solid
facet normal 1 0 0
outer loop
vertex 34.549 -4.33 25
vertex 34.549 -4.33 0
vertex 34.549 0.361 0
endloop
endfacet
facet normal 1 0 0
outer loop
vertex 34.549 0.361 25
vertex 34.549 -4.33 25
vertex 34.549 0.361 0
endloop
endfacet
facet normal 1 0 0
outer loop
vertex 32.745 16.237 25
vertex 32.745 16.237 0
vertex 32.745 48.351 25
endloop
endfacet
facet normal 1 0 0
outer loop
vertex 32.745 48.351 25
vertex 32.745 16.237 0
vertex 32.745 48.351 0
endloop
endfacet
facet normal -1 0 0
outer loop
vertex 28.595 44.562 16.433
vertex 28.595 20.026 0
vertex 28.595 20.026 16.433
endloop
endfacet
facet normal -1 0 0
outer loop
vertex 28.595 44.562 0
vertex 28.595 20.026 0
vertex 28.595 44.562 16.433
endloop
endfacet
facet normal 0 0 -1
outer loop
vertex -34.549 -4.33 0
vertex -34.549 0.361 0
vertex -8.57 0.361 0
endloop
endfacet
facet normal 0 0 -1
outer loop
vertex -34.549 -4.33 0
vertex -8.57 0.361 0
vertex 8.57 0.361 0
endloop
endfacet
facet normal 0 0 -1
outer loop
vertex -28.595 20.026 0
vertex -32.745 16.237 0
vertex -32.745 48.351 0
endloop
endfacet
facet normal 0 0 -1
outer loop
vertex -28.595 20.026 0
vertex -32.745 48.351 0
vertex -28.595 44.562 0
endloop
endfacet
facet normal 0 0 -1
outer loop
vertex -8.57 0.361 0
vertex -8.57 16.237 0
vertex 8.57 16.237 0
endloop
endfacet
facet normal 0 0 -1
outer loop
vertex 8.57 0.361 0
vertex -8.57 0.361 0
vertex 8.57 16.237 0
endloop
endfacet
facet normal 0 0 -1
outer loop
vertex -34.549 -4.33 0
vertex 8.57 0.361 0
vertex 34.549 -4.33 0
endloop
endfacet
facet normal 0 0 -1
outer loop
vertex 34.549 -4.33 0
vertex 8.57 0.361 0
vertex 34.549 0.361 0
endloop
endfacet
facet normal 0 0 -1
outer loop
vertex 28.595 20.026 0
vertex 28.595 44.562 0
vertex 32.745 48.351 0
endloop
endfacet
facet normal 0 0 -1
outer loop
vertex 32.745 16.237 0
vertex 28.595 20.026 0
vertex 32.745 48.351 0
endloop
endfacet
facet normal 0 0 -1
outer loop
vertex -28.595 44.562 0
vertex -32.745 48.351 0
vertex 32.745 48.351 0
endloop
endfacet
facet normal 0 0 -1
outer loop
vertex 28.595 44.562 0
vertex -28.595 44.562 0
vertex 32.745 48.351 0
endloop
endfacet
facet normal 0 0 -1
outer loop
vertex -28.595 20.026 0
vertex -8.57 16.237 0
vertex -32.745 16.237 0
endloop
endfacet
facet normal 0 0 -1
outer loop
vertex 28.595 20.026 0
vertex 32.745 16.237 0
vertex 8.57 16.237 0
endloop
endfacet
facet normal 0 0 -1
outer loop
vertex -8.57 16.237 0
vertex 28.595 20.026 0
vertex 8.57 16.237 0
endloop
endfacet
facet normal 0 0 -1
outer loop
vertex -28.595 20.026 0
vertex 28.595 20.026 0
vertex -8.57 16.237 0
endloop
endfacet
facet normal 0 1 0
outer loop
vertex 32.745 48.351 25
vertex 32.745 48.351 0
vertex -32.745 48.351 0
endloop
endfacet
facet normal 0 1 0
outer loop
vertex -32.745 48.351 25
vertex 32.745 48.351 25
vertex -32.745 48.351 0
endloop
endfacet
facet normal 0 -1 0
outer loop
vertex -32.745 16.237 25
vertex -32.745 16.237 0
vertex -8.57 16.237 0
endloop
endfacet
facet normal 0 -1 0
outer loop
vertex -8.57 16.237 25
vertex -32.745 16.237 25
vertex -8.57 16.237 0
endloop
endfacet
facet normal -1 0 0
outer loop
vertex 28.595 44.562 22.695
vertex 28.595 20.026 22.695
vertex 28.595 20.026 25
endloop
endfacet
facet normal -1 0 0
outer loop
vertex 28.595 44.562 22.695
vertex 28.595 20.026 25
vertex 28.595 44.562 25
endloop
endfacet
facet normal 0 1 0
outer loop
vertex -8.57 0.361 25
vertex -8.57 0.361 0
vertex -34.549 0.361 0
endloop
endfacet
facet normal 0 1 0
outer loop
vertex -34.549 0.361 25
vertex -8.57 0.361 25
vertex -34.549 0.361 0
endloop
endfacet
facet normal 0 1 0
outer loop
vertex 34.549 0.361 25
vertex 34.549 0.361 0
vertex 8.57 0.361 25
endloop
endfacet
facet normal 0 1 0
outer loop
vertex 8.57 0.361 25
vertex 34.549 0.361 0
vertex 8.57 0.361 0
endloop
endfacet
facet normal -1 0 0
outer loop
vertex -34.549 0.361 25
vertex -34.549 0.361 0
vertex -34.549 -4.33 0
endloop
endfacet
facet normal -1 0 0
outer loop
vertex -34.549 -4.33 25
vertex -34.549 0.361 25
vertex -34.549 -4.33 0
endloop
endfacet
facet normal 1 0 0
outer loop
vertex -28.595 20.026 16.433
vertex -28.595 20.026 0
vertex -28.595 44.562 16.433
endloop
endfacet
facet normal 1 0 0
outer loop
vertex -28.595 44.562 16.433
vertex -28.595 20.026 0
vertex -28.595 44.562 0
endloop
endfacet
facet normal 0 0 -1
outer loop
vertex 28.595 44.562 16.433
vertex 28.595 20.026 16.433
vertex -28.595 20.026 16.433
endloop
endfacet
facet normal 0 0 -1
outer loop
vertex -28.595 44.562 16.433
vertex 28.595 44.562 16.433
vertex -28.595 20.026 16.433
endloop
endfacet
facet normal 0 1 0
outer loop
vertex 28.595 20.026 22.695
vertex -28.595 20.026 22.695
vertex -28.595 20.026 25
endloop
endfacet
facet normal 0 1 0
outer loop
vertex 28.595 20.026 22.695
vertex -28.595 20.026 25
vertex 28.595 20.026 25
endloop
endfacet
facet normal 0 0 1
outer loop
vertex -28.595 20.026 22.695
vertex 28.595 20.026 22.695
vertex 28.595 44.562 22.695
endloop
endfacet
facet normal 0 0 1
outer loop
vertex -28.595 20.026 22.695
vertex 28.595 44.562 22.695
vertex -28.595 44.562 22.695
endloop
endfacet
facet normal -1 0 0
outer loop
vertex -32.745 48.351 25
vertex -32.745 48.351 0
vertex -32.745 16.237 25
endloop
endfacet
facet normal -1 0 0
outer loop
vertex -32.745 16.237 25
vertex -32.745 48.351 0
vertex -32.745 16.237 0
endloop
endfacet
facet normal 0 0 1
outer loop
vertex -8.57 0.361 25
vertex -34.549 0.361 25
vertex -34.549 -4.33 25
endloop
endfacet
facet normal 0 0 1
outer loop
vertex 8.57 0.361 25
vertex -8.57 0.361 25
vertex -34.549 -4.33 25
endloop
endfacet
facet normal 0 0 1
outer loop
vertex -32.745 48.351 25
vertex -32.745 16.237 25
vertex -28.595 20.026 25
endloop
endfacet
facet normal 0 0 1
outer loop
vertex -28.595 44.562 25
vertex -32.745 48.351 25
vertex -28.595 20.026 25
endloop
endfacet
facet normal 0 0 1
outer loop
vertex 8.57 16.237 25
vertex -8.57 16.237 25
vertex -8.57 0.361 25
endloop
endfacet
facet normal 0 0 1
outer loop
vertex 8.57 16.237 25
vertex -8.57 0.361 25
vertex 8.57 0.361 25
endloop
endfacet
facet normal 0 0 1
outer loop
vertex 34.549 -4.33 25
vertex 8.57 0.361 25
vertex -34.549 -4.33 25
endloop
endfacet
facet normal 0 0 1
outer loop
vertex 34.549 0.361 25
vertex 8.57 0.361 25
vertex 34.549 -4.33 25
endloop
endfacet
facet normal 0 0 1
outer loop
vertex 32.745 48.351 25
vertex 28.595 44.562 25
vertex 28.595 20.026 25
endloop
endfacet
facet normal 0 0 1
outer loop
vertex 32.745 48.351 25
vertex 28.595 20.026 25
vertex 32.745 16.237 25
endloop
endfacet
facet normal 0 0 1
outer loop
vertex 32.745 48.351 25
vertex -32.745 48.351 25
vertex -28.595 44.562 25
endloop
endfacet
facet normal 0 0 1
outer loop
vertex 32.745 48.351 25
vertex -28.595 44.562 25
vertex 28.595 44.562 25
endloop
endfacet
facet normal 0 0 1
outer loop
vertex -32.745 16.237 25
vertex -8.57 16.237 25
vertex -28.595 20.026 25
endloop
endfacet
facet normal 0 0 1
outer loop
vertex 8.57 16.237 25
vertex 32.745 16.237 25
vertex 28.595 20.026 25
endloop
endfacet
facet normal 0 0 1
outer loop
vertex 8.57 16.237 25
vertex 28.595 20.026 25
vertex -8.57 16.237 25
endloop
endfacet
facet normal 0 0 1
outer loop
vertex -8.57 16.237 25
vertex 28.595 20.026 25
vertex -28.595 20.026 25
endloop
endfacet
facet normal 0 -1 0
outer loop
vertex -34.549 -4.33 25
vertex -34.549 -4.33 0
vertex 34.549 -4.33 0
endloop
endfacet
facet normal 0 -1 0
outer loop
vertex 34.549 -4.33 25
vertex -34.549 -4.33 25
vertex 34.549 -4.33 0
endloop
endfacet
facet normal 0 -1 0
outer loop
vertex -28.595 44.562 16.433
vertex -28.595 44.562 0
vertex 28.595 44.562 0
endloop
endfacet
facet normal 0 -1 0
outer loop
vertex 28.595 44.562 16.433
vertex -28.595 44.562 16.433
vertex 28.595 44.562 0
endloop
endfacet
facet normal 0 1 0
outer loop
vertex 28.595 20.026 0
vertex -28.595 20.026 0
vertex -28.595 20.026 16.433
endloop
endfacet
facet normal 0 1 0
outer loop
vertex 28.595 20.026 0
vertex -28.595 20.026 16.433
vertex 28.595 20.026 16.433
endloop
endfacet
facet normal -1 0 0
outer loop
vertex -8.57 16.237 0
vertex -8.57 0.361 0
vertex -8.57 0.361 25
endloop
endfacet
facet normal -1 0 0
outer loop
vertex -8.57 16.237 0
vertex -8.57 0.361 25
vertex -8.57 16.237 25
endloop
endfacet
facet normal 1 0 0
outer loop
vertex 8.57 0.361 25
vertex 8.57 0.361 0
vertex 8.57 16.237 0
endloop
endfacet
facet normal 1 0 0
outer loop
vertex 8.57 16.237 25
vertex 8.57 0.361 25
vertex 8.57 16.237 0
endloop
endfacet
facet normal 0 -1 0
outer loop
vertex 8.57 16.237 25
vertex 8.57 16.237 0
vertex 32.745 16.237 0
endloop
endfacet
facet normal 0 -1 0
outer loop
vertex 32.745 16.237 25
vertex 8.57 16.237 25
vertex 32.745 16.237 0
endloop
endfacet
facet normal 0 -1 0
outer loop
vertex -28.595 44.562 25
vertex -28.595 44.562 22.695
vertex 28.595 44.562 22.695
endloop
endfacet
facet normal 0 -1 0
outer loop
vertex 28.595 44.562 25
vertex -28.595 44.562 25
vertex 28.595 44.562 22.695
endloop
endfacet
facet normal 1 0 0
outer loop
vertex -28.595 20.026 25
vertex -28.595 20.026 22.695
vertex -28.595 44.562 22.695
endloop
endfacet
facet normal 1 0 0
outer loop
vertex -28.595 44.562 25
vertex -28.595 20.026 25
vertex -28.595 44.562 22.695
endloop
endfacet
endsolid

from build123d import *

# Parameters (mm, degrees)
F0_W     = 57.1907274425
F0_H     = 24.536088109
F0_W_2   = 17.1391749755
F0_H_2   = 15.8762889914
F0_H_3   = 0.3608246334
F1_DEPTH = 25
F2_W     = 57.1907274425
F2_H     = 6.2615685165
F3_DEPTH = 25.4


with BuildPart() as f1:
    # F0 (on Top) → F1 (new body)
    with BuildSketch(Plane.XY):
        Polygon((32.7448472381, 16.2371136248), (32.7448472381, 48.3505167067), (-32.7448472381, 48.3505167067), (-32.7448472381, 16.2371136248), (-8.5695888847, 16.2371136248), (8.5695860907, 16.2371136248), align=None)
        with Locations((0, 32.2938151658)):
            Rectangle(F0_W, F0_H, mode=Mode.SUBTRACT)
        with Locations((-1.397e-06, 8.2989691291)):
            Rectangle(F0_W_2, F0_H_2)
        Polygon((34.5489680767, 0.3608246334), (8.5695860907, 0.3608246334), (8.5695860907, 0), (-8.5695888847, 0), (-8.5695888847, 0.3608246334), (-34.5489680767, 0.3608246334), (-34.5489680767, -4.3298969977), (34.5489680767, -4.3298969977), align=None)
        with Locations((-1.397e-06, 0.1804123167)):
            Rectangle(F0_W_2, F0_H_3)
    extrude(amount=F1_DEPTH)

    # F2 (on face) → F3 (join)
    with BuildSketch(Plane(origin=(0, 20.0257711112, 0), x_dir=(-1, 0, 0), z_dir=(0, 1, 0))):
        with Locations((0, 19.563915208)):
            Rectangle(F2_W, F2_H)
    extrude(amount=F3_DEPTH)


solid = f1.part
